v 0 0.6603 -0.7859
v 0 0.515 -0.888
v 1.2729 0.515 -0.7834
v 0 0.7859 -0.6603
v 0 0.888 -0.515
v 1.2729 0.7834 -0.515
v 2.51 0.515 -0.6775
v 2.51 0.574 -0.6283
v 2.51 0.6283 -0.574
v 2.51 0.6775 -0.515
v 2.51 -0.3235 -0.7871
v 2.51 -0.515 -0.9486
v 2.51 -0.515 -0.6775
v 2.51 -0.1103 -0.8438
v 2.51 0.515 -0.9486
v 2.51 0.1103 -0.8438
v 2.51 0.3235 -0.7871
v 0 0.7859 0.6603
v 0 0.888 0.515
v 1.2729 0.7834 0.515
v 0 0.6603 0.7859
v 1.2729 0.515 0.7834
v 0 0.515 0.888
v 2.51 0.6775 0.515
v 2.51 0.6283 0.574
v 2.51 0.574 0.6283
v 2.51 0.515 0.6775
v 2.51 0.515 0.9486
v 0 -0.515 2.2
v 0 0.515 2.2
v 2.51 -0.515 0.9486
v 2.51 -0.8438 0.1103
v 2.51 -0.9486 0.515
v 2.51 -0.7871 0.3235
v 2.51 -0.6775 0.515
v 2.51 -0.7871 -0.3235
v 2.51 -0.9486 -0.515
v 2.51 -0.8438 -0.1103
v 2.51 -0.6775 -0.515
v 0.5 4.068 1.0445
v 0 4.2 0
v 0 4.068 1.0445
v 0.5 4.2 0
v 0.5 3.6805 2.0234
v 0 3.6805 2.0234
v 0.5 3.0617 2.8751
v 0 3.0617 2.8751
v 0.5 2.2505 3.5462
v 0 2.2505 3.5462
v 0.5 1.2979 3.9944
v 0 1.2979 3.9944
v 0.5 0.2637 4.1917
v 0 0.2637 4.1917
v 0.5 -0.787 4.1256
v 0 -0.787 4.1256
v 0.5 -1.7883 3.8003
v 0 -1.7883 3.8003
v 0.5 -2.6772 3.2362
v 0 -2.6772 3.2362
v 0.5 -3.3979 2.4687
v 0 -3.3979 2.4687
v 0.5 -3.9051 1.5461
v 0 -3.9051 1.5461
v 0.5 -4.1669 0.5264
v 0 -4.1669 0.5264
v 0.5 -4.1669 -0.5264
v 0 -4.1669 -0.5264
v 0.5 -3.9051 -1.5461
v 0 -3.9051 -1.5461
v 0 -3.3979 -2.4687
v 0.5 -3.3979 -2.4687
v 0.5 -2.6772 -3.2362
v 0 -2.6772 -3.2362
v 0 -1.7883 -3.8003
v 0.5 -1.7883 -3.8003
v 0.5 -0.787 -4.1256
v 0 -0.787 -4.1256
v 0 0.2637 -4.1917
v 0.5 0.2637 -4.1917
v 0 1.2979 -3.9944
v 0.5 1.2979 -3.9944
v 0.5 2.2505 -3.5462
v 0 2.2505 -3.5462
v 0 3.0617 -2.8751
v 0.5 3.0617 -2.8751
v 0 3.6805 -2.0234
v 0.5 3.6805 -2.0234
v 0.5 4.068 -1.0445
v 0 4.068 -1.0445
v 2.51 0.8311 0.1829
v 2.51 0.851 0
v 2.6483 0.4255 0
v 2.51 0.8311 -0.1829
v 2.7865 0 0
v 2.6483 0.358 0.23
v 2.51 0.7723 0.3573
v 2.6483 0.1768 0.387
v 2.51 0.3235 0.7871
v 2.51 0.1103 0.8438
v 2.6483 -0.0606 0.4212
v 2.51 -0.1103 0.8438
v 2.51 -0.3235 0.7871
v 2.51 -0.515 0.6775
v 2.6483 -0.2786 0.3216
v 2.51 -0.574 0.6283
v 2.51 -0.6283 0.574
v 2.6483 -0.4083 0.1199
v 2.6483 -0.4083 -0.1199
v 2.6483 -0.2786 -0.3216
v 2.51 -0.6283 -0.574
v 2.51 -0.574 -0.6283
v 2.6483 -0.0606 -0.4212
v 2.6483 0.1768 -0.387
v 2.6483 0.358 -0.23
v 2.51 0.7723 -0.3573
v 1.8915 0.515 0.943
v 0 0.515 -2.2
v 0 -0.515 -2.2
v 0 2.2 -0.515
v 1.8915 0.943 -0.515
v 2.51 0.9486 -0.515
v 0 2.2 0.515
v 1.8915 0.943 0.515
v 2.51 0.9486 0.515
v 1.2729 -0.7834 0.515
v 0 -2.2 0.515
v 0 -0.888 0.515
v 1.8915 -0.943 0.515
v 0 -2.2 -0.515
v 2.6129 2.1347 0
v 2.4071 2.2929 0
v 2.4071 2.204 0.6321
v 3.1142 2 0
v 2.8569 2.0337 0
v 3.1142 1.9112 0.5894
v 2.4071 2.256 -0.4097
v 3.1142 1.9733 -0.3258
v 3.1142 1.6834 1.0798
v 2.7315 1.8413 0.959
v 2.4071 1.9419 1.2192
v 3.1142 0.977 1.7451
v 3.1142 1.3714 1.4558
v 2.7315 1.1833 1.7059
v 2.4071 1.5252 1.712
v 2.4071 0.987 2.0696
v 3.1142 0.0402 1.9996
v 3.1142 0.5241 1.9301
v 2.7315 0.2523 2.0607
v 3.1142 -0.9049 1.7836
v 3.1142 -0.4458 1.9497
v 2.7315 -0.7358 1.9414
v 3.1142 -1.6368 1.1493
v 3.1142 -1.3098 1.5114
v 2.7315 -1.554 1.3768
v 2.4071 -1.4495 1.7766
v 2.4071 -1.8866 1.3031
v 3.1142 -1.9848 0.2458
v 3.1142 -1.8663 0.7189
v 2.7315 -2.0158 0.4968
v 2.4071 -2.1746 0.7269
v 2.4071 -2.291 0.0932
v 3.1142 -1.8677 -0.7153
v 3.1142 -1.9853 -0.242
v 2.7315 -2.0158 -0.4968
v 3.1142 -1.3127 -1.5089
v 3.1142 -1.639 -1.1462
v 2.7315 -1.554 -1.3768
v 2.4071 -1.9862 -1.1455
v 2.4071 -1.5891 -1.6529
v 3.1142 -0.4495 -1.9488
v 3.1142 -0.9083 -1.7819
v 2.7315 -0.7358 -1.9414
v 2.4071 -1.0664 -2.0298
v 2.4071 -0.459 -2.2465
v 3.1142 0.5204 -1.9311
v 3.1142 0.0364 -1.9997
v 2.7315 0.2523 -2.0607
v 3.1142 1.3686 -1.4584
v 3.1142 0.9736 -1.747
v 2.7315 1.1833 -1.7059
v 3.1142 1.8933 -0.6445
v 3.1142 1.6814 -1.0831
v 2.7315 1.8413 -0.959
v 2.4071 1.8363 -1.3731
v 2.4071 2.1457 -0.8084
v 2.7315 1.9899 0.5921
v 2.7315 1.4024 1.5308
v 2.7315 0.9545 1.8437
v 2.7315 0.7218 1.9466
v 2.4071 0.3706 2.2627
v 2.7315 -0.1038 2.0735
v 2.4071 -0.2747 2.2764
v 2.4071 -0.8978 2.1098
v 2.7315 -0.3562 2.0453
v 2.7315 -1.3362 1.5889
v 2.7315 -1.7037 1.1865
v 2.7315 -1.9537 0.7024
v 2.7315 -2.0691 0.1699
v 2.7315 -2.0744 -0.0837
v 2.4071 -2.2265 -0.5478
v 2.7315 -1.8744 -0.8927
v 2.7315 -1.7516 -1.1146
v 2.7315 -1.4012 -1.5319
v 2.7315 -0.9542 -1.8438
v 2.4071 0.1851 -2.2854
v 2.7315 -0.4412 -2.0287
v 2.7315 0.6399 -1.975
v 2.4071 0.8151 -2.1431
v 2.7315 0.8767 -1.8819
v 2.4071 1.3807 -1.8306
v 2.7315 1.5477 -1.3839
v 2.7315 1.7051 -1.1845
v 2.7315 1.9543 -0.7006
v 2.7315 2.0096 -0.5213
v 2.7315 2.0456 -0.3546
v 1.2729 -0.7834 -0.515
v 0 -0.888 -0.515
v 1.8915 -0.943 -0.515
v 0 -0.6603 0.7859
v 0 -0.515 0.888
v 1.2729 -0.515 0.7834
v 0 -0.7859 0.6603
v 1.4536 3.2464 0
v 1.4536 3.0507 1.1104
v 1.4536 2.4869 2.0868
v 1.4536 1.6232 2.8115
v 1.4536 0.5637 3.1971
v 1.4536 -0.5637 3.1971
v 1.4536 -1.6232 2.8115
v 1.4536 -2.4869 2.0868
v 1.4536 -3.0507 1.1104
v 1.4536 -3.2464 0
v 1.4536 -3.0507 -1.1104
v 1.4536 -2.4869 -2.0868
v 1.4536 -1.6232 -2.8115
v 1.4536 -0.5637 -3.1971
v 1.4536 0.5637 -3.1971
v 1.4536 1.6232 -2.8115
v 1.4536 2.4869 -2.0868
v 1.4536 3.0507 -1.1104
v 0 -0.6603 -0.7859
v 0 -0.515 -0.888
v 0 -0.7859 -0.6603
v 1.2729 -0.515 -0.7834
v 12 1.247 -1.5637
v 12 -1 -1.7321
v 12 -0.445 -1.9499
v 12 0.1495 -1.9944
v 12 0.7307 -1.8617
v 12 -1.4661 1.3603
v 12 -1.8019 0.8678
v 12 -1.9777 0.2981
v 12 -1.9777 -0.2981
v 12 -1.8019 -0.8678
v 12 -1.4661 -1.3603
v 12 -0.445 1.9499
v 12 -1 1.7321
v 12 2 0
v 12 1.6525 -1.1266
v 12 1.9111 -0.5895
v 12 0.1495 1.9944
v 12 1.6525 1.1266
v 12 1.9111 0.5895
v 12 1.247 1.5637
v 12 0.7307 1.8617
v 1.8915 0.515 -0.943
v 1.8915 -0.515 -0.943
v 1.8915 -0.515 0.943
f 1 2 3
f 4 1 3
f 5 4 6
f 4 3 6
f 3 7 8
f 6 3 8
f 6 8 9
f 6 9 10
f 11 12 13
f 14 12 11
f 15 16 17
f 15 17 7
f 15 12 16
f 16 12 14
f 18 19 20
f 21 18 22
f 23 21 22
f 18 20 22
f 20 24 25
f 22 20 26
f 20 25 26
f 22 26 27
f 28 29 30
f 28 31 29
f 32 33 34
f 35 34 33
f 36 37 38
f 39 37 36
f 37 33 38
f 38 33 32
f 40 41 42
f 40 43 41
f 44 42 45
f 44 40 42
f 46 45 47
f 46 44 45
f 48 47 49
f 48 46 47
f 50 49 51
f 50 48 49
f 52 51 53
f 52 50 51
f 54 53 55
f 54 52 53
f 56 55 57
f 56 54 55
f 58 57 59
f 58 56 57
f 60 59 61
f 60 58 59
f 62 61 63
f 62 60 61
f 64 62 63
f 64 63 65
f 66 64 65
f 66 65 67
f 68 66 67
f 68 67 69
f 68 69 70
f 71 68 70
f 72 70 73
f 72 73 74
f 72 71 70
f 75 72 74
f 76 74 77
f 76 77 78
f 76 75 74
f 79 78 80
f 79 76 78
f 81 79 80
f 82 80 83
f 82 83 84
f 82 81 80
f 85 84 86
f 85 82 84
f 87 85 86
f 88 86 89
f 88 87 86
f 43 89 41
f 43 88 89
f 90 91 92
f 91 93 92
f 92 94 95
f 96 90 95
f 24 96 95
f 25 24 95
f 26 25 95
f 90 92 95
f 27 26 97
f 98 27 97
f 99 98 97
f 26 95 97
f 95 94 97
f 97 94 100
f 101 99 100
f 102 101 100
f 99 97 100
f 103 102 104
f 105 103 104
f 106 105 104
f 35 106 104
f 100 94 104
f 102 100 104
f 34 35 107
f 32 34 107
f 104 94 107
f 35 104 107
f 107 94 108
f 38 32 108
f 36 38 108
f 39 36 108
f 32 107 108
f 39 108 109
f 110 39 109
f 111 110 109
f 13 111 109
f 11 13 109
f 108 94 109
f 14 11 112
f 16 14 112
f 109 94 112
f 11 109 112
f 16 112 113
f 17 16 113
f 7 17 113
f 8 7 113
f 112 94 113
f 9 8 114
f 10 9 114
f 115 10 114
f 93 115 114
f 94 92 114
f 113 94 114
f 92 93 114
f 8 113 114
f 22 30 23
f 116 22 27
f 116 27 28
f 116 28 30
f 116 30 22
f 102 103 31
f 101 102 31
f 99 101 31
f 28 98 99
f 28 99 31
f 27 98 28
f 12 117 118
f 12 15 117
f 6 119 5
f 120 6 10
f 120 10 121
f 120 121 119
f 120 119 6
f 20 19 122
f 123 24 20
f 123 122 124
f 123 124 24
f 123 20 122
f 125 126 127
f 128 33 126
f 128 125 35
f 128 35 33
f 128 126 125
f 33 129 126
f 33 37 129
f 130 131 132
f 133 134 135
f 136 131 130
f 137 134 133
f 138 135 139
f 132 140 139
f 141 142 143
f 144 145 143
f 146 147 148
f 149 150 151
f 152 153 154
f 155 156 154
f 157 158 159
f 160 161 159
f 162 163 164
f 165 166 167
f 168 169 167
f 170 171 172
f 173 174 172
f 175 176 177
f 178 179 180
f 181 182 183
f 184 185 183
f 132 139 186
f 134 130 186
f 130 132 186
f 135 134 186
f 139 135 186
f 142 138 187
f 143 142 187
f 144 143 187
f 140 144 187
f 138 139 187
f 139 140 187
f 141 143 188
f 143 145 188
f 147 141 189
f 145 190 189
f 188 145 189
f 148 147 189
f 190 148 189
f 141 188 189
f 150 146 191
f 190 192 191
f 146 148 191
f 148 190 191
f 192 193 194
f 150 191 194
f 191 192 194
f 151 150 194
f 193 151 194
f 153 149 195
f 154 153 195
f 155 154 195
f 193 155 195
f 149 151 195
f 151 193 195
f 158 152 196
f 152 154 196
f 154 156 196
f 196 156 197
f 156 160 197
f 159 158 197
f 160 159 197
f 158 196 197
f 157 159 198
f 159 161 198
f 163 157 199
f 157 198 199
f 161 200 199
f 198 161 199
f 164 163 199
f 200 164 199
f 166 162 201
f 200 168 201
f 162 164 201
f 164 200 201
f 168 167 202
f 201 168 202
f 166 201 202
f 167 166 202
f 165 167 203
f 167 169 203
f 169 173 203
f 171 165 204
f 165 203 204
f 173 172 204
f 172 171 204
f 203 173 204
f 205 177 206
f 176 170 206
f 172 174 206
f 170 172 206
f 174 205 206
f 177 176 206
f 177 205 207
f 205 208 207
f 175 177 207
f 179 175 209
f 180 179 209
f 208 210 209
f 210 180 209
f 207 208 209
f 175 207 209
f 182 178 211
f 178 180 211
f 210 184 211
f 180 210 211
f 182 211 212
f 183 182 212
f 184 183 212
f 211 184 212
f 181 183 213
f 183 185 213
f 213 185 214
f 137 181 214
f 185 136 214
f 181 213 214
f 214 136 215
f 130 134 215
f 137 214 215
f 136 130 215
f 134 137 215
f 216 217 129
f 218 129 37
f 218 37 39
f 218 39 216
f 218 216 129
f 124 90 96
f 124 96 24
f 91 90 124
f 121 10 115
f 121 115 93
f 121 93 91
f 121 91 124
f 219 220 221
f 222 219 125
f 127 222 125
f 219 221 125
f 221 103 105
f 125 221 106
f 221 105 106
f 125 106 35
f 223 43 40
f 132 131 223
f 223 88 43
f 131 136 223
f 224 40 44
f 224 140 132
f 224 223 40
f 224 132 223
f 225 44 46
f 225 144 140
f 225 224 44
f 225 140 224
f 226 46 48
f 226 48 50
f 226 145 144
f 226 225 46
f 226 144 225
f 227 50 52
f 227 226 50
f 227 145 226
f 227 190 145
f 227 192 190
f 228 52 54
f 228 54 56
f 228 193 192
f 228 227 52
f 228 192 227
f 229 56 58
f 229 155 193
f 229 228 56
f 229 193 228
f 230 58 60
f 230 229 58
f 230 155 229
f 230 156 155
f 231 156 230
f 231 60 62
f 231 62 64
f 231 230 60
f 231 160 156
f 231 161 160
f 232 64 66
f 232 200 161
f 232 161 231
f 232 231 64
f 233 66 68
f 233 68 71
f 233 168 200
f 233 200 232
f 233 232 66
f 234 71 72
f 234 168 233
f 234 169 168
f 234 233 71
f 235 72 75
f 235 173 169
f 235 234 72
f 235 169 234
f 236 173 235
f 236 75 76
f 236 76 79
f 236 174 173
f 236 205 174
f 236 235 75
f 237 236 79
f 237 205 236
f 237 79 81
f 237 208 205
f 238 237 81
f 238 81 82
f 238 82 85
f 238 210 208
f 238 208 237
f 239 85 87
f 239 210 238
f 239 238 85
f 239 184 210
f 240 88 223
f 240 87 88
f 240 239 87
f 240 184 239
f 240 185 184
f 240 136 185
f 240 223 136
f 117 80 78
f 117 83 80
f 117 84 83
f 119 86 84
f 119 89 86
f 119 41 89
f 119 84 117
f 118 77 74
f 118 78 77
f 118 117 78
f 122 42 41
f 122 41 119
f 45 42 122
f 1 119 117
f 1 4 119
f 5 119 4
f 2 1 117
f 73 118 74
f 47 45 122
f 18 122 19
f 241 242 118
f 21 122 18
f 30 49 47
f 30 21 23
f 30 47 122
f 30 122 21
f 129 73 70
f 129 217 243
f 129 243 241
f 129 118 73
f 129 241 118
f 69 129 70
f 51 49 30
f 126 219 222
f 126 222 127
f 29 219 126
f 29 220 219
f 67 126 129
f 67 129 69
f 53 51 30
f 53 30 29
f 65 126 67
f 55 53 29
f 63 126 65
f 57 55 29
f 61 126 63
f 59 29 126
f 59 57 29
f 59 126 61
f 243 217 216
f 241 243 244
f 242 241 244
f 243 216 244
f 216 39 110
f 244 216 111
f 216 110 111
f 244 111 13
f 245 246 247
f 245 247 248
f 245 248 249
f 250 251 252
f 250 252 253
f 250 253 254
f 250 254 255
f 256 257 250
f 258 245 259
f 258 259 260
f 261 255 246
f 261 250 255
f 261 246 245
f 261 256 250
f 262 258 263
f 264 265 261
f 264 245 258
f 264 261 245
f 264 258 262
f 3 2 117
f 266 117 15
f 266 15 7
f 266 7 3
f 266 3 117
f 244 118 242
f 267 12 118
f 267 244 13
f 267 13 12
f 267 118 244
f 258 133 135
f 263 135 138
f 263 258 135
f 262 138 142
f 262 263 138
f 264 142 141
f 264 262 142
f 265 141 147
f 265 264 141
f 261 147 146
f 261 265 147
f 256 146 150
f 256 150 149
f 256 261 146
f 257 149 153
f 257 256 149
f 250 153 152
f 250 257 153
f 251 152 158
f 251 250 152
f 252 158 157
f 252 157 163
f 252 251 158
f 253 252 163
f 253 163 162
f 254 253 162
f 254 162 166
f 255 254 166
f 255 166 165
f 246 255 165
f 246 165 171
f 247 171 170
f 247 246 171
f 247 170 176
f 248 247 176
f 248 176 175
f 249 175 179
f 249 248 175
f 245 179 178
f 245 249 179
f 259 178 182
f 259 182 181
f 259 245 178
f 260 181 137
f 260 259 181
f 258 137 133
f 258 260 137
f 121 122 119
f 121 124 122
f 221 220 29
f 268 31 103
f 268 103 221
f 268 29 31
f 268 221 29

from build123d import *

# Parameters (mm, degrees)
FILLET1_R    = 1
SKETCH3_W    = 1.03
SKETCH3_H    = 4.4
SKETCH4_W    = 1.03
SKETCH4_H    = 1.897120414
RECPAT_COUNT = 2
RECPAT_ANGLE = 90


with BuildPart() as part:
    # BodySke → Base-Revolve (revolve)
    with BuildSketch(Plane.XY):
        Polygon((0, 0), (0, 4.2), (0.5, 4.2), (2.7, 2), (12, 2), (12, 0), align=None)
    revolve(axis=Axis((-6.35, 0, 0), (1, 0, 0)))

    # Fillet1
    fillet1_edges = [part.edges().sort_by_distance(p)[0] for p in [
        (2.7, -2, 0),
    ]]
    fillet(fillet1_edges, radius=FILLET1_R)

    # Sketch3 → Recess section 0
    with BuildSketch(Plane.ZY):
        Rectangle(SKETCH3_W, SKETCH3_H)
    # Sketch4 → Recess section 1
    with BuildSketch(Plane.ZY.offset(-2.51)):
        Rectangle(SKETCH4_W, SKETCH4_H)
    recess = loft(mode=Mode.SUBTRACT)

    # RecPat: Recess ×2 about axis
    recpat_axis = Axis((0, 0, 0), (1, 0, 0))
    for i in range(1, RECPAT_COUNT):
        add(recess.rotate(recpat_axis, i * RECPAT_ANGLE / (RECPAT_COUNT - 1)), mode=Mode.SUBTRACT)

    # RecCorSke → RecessCore (revolve, cut)
    with BuildSketch(Plane.XY):
        Polygon((0, 0), (0, 1.026516298), (2.51, 0.851), (2.786506661, 0), align=None)
    revolve(axis=Axis((-3.175, 0, 0), (1, 0, 0)), mode=Mode.SUBTRACT)


solid = part.part
